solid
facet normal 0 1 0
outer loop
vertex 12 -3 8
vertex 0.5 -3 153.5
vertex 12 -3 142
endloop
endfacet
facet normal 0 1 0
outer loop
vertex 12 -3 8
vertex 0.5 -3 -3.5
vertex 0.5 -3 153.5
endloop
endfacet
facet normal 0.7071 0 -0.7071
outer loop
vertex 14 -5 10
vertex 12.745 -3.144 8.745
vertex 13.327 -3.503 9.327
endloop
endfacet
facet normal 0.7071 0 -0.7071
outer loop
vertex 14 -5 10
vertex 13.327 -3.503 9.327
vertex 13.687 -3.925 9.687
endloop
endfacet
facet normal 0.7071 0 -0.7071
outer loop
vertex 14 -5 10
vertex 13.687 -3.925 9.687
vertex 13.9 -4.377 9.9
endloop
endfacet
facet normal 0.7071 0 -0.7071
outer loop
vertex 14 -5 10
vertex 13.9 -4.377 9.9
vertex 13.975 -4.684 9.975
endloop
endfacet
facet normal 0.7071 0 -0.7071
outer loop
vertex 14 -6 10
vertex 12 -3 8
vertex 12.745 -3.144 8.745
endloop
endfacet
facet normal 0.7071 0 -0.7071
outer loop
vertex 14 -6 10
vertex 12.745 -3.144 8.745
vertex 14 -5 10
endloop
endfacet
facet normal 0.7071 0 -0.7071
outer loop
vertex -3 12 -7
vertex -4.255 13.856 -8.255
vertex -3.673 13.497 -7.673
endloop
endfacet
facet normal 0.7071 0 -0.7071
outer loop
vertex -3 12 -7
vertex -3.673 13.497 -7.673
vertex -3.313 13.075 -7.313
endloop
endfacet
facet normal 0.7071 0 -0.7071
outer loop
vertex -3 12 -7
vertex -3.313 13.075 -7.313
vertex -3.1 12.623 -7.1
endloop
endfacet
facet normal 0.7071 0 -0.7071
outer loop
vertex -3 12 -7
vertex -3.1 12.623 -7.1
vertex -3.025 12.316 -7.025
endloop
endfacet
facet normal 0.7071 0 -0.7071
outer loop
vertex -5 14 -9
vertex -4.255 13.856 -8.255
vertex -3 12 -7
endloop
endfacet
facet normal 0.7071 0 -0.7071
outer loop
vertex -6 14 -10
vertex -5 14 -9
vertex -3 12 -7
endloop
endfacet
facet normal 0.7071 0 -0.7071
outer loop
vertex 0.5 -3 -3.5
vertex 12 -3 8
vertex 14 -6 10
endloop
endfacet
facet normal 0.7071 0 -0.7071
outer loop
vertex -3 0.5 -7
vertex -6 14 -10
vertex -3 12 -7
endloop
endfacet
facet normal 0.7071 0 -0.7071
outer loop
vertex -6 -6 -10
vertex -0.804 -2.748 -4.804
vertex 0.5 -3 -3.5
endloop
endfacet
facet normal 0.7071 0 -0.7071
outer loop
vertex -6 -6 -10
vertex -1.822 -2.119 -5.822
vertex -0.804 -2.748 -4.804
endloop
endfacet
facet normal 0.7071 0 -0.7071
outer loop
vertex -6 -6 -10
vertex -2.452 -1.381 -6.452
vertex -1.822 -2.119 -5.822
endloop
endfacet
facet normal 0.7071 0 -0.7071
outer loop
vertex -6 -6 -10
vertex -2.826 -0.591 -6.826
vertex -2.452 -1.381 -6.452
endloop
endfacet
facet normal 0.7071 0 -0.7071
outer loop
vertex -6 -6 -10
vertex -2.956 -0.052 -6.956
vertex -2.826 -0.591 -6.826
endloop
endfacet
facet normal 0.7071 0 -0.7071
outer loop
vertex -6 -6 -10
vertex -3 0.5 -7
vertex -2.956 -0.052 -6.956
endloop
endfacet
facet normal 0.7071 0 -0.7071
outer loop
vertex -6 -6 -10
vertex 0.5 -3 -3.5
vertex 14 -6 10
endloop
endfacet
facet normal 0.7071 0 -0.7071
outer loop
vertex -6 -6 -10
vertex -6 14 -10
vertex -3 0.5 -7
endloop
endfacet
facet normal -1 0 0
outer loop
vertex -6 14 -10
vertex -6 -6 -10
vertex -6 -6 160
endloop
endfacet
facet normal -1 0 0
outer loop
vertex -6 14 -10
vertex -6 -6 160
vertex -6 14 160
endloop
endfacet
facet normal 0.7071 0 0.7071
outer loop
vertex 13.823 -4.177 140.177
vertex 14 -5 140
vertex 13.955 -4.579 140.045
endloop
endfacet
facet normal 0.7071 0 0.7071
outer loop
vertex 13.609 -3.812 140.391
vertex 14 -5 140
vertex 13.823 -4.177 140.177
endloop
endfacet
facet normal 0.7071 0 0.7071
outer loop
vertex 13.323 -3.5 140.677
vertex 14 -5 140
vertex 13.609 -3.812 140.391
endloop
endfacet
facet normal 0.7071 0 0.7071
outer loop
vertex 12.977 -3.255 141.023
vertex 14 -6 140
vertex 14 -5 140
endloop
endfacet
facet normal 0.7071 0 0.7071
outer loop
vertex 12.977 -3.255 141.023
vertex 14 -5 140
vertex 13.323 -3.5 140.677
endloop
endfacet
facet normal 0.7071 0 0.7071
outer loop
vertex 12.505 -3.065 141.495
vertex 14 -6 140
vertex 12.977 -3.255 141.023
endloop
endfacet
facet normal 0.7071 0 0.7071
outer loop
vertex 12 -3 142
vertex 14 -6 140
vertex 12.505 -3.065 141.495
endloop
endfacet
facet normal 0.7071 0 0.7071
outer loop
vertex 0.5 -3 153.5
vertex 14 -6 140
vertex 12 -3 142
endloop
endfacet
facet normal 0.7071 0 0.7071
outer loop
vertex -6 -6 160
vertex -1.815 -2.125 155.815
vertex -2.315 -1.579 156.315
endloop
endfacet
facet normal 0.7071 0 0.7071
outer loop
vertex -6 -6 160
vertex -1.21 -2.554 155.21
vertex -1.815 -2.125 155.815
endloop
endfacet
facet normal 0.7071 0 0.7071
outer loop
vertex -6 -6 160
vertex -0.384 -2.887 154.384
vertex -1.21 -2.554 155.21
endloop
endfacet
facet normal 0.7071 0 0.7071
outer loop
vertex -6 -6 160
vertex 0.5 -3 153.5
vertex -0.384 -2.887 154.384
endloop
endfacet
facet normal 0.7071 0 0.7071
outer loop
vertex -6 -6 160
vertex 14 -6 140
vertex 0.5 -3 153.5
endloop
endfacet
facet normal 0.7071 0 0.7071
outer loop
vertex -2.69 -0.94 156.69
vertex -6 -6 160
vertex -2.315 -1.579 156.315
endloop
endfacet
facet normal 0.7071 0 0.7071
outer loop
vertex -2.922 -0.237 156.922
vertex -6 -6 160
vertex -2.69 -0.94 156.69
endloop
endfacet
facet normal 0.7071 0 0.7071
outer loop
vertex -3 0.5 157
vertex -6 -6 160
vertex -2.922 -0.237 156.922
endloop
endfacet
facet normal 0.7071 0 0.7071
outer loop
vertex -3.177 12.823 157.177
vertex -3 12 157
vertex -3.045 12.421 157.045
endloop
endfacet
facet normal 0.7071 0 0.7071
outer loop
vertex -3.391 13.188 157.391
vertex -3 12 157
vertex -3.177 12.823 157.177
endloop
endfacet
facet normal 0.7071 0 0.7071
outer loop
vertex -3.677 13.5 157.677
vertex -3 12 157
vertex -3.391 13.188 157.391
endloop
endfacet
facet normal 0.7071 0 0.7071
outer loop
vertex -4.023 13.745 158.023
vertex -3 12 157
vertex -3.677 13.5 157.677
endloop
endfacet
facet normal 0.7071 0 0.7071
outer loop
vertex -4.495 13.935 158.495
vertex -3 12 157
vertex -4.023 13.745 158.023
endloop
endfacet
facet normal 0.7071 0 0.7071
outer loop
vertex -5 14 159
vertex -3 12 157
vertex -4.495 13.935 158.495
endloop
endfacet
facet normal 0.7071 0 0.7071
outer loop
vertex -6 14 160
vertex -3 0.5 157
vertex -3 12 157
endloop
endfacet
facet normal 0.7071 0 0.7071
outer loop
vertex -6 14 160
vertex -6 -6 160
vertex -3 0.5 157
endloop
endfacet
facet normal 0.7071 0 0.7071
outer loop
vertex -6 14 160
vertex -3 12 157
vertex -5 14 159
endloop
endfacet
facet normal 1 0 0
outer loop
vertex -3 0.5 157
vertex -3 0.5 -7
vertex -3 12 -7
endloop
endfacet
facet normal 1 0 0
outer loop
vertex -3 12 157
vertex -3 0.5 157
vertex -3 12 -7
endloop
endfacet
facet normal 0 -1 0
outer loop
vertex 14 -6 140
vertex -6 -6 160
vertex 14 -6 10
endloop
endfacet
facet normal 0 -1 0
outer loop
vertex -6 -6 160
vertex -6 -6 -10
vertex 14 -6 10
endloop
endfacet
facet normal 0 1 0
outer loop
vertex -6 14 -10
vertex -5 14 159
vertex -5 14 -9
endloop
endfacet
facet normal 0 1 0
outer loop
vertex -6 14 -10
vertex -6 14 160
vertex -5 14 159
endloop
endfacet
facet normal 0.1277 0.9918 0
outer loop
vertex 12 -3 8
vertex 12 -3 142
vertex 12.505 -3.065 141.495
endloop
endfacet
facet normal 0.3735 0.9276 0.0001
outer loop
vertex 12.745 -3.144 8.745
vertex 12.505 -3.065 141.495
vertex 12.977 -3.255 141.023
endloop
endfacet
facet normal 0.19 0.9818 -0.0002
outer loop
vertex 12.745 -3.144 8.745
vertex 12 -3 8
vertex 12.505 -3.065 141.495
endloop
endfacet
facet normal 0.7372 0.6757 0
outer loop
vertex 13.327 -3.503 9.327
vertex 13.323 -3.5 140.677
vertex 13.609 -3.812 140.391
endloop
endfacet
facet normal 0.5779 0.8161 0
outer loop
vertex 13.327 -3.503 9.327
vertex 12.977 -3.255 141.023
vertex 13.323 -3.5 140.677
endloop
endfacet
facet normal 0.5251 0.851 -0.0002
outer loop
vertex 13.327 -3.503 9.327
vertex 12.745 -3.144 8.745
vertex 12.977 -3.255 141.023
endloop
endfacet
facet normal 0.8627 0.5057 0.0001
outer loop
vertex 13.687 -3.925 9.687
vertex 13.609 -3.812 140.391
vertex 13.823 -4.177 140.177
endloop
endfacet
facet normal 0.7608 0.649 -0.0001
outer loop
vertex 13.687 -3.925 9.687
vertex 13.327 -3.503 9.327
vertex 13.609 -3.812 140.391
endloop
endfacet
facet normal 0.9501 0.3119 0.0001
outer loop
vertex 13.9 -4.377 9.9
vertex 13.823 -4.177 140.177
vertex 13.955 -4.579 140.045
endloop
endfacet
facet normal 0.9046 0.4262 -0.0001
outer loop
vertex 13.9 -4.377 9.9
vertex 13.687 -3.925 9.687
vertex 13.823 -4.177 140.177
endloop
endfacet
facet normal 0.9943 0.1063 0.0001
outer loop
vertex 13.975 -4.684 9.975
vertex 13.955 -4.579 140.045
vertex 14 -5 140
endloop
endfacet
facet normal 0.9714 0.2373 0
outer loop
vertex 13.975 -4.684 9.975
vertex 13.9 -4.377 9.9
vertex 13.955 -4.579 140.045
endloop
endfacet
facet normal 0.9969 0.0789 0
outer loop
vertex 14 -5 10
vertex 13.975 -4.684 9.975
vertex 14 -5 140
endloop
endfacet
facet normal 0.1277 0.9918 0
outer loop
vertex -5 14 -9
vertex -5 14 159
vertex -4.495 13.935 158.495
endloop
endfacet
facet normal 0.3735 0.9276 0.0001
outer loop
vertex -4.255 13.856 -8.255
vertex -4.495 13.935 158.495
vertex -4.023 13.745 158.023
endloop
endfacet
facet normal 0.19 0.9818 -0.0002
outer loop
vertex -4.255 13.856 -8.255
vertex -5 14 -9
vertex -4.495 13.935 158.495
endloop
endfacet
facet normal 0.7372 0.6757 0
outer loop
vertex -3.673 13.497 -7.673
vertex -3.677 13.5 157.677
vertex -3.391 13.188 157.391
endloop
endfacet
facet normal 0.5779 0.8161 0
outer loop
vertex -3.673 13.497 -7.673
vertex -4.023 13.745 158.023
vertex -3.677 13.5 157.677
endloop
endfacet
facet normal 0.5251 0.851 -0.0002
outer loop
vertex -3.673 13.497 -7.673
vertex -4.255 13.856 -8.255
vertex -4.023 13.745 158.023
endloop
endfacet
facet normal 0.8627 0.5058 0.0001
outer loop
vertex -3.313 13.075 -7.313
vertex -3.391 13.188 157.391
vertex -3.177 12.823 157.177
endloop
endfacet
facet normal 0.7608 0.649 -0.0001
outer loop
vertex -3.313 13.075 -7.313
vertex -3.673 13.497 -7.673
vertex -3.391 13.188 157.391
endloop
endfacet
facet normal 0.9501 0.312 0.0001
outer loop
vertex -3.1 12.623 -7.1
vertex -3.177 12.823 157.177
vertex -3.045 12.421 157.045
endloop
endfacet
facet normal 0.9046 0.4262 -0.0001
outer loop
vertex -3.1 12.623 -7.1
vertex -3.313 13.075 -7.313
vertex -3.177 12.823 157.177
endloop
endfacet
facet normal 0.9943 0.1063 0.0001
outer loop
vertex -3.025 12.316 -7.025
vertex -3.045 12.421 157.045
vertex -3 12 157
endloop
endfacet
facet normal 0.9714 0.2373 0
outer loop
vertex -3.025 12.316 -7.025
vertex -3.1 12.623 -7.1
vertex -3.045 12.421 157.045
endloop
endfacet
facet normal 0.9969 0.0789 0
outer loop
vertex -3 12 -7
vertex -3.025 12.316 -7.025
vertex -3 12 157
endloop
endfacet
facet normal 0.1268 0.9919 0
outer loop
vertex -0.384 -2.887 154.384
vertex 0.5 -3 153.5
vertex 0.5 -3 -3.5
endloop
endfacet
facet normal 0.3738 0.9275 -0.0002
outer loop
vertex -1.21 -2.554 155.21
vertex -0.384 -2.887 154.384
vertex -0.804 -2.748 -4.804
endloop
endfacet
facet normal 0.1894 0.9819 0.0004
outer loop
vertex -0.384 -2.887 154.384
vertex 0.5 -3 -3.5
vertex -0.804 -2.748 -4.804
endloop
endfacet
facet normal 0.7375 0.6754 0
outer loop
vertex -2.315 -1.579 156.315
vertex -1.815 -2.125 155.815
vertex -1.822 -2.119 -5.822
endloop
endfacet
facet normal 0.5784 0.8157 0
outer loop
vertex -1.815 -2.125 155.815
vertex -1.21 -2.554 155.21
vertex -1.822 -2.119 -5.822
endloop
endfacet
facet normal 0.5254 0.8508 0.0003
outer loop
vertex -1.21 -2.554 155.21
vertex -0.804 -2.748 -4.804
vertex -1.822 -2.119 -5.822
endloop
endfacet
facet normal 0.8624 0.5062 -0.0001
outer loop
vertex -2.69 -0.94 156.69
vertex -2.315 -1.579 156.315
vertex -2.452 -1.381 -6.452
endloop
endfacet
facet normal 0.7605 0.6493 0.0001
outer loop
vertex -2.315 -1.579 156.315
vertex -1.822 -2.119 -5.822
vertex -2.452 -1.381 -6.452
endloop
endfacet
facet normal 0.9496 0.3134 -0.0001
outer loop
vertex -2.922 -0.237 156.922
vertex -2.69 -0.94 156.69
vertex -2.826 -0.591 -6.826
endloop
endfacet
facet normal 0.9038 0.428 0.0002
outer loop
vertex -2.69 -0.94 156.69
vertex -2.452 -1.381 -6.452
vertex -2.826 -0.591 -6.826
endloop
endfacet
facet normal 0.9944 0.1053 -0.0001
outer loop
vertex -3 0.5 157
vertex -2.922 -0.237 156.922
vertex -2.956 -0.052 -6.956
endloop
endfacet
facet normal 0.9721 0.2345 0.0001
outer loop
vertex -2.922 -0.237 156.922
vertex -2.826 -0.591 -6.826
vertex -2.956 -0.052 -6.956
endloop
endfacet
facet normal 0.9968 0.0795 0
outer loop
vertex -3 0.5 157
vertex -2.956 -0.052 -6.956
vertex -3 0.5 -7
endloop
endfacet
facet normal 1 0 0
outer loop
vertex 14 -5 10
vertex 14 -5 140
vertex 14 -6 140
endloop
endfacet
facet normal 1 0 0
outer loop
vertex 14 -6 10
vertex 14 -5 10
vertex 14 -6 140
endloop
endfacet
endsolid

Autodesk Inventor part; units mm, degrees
ref_plane "Start plane" through (0, 0, -10) normal (0, 0, 1) x (1, 0, 0)
ref_plane "End plane" through (0, 0, 160) normal (0, 0, 1) x (1, 0, 0)
sketch "Sketch" plane through (0, 0, 0) normal (0, 0, 1) x (1, 0, 0)
  line L0 (-3, 0.5) -> (-3, 12)
  line L1 (-6, 14) -> (-5, 14)
  line L2 (-6, -6) -> (-6, 14)
  line L3 (-6, -6) -> (14, -6)
  line L4 (14, -5) -> (14, -6)
  line L5 (0.5, -3) -> (12, -3)
  arc A0 (-3, 0.5) -> (0.5, -3) centre (0.5, 0.5) ccw
  arc A1 (-3, 12) -> (-5, 14) centre (-5, 12) ccw
  arc A2 (14, -5) -> (12, -3) centre (12, -5) ccw
  line L6 (0, 18.4971) -> (0, -10.0828) construction
  line L7 (-10.0828, 0) -> (18.4971, 0) construction
  point P0 (-3, -3)
  point P1 (-3, 14)
  point P2 (14, -3)
  dimension "d4" = 20
  dimension "d6" = 20
  dimension "d8" = 3
  dimension "d10" = 3
  dimension "d17" = 3.5
  dimension "d18" = 2
  dimension "d19" = 6
  dimension "d20" = 6
extrude "Body" add sketch "Sketch" along normal up to surface (170 mm away) from surface at -10
sketch "Sketch3" plane through (0, 0, 0) normal (0, 0, 1) x (1, 0, 0)
  line L0 (0, 0) -> (10, 0)
ref_plane "Work Plane10" through (0, 0, 0) normal (0, -1, 0) x (1, 0, 0)
sketch "Sketch4" plane through (0, 0, 0) normal (0, -1, 0) x (1, 0, 0)
  line L0 (-2, -10) -> (12, -10)
  line L1 (-2, 160) -> (12, 160)
  dimension "d24" = 170
ref_plane "Work Plane11" through (-6, 4, -10) normal (0.7071, 0, -0.7071) x (-0.7071, 0, -0.7071)
split "Split1" plane through (-6, 4, -10) removes the side toward (0.7071, 0, -0.7071)
ref_plane "Work Plane12" through (-6, 4, 160) normal (0.7071, 0, 0.7071) x (0.7071, 0, -0.7071)
split "Split2" plane through (-6, 4, 160) removes the side toward (0.7071, 0, 0.7071)
equation "\"d4\" = b"
equation "\"d6\" = b"
equation "\"d8\" = ParT"
equation "\"d10\" = ParT"
equation "\"d17\" = R"
equation "\"d18\" = R1"
equation "\"d19\" = ex"
equation "\"d20\" = d19"
equation "\"d11\" = G_L"
equation "\"b\" = 20"
equation "\"ParT\" = 3"
equation "\"R\" = 3.5"
equation "\"R1\" = 2"
equation "\"G_L\" = d24"
equation "\"ex\" = 6"
equation "\"G_OFFSET_START\" = 10"
equation "\"G_OFFSET_END\" = 10"
equation "\"d21\" = -G_OFFSET_START"
equation "\"d22\" = G_OFFSET_END + B_L"
equation "\"B_L\" = 150"
properties part number "ISO 657-1 - L20x20x3-170" material "Stainless Steel"
